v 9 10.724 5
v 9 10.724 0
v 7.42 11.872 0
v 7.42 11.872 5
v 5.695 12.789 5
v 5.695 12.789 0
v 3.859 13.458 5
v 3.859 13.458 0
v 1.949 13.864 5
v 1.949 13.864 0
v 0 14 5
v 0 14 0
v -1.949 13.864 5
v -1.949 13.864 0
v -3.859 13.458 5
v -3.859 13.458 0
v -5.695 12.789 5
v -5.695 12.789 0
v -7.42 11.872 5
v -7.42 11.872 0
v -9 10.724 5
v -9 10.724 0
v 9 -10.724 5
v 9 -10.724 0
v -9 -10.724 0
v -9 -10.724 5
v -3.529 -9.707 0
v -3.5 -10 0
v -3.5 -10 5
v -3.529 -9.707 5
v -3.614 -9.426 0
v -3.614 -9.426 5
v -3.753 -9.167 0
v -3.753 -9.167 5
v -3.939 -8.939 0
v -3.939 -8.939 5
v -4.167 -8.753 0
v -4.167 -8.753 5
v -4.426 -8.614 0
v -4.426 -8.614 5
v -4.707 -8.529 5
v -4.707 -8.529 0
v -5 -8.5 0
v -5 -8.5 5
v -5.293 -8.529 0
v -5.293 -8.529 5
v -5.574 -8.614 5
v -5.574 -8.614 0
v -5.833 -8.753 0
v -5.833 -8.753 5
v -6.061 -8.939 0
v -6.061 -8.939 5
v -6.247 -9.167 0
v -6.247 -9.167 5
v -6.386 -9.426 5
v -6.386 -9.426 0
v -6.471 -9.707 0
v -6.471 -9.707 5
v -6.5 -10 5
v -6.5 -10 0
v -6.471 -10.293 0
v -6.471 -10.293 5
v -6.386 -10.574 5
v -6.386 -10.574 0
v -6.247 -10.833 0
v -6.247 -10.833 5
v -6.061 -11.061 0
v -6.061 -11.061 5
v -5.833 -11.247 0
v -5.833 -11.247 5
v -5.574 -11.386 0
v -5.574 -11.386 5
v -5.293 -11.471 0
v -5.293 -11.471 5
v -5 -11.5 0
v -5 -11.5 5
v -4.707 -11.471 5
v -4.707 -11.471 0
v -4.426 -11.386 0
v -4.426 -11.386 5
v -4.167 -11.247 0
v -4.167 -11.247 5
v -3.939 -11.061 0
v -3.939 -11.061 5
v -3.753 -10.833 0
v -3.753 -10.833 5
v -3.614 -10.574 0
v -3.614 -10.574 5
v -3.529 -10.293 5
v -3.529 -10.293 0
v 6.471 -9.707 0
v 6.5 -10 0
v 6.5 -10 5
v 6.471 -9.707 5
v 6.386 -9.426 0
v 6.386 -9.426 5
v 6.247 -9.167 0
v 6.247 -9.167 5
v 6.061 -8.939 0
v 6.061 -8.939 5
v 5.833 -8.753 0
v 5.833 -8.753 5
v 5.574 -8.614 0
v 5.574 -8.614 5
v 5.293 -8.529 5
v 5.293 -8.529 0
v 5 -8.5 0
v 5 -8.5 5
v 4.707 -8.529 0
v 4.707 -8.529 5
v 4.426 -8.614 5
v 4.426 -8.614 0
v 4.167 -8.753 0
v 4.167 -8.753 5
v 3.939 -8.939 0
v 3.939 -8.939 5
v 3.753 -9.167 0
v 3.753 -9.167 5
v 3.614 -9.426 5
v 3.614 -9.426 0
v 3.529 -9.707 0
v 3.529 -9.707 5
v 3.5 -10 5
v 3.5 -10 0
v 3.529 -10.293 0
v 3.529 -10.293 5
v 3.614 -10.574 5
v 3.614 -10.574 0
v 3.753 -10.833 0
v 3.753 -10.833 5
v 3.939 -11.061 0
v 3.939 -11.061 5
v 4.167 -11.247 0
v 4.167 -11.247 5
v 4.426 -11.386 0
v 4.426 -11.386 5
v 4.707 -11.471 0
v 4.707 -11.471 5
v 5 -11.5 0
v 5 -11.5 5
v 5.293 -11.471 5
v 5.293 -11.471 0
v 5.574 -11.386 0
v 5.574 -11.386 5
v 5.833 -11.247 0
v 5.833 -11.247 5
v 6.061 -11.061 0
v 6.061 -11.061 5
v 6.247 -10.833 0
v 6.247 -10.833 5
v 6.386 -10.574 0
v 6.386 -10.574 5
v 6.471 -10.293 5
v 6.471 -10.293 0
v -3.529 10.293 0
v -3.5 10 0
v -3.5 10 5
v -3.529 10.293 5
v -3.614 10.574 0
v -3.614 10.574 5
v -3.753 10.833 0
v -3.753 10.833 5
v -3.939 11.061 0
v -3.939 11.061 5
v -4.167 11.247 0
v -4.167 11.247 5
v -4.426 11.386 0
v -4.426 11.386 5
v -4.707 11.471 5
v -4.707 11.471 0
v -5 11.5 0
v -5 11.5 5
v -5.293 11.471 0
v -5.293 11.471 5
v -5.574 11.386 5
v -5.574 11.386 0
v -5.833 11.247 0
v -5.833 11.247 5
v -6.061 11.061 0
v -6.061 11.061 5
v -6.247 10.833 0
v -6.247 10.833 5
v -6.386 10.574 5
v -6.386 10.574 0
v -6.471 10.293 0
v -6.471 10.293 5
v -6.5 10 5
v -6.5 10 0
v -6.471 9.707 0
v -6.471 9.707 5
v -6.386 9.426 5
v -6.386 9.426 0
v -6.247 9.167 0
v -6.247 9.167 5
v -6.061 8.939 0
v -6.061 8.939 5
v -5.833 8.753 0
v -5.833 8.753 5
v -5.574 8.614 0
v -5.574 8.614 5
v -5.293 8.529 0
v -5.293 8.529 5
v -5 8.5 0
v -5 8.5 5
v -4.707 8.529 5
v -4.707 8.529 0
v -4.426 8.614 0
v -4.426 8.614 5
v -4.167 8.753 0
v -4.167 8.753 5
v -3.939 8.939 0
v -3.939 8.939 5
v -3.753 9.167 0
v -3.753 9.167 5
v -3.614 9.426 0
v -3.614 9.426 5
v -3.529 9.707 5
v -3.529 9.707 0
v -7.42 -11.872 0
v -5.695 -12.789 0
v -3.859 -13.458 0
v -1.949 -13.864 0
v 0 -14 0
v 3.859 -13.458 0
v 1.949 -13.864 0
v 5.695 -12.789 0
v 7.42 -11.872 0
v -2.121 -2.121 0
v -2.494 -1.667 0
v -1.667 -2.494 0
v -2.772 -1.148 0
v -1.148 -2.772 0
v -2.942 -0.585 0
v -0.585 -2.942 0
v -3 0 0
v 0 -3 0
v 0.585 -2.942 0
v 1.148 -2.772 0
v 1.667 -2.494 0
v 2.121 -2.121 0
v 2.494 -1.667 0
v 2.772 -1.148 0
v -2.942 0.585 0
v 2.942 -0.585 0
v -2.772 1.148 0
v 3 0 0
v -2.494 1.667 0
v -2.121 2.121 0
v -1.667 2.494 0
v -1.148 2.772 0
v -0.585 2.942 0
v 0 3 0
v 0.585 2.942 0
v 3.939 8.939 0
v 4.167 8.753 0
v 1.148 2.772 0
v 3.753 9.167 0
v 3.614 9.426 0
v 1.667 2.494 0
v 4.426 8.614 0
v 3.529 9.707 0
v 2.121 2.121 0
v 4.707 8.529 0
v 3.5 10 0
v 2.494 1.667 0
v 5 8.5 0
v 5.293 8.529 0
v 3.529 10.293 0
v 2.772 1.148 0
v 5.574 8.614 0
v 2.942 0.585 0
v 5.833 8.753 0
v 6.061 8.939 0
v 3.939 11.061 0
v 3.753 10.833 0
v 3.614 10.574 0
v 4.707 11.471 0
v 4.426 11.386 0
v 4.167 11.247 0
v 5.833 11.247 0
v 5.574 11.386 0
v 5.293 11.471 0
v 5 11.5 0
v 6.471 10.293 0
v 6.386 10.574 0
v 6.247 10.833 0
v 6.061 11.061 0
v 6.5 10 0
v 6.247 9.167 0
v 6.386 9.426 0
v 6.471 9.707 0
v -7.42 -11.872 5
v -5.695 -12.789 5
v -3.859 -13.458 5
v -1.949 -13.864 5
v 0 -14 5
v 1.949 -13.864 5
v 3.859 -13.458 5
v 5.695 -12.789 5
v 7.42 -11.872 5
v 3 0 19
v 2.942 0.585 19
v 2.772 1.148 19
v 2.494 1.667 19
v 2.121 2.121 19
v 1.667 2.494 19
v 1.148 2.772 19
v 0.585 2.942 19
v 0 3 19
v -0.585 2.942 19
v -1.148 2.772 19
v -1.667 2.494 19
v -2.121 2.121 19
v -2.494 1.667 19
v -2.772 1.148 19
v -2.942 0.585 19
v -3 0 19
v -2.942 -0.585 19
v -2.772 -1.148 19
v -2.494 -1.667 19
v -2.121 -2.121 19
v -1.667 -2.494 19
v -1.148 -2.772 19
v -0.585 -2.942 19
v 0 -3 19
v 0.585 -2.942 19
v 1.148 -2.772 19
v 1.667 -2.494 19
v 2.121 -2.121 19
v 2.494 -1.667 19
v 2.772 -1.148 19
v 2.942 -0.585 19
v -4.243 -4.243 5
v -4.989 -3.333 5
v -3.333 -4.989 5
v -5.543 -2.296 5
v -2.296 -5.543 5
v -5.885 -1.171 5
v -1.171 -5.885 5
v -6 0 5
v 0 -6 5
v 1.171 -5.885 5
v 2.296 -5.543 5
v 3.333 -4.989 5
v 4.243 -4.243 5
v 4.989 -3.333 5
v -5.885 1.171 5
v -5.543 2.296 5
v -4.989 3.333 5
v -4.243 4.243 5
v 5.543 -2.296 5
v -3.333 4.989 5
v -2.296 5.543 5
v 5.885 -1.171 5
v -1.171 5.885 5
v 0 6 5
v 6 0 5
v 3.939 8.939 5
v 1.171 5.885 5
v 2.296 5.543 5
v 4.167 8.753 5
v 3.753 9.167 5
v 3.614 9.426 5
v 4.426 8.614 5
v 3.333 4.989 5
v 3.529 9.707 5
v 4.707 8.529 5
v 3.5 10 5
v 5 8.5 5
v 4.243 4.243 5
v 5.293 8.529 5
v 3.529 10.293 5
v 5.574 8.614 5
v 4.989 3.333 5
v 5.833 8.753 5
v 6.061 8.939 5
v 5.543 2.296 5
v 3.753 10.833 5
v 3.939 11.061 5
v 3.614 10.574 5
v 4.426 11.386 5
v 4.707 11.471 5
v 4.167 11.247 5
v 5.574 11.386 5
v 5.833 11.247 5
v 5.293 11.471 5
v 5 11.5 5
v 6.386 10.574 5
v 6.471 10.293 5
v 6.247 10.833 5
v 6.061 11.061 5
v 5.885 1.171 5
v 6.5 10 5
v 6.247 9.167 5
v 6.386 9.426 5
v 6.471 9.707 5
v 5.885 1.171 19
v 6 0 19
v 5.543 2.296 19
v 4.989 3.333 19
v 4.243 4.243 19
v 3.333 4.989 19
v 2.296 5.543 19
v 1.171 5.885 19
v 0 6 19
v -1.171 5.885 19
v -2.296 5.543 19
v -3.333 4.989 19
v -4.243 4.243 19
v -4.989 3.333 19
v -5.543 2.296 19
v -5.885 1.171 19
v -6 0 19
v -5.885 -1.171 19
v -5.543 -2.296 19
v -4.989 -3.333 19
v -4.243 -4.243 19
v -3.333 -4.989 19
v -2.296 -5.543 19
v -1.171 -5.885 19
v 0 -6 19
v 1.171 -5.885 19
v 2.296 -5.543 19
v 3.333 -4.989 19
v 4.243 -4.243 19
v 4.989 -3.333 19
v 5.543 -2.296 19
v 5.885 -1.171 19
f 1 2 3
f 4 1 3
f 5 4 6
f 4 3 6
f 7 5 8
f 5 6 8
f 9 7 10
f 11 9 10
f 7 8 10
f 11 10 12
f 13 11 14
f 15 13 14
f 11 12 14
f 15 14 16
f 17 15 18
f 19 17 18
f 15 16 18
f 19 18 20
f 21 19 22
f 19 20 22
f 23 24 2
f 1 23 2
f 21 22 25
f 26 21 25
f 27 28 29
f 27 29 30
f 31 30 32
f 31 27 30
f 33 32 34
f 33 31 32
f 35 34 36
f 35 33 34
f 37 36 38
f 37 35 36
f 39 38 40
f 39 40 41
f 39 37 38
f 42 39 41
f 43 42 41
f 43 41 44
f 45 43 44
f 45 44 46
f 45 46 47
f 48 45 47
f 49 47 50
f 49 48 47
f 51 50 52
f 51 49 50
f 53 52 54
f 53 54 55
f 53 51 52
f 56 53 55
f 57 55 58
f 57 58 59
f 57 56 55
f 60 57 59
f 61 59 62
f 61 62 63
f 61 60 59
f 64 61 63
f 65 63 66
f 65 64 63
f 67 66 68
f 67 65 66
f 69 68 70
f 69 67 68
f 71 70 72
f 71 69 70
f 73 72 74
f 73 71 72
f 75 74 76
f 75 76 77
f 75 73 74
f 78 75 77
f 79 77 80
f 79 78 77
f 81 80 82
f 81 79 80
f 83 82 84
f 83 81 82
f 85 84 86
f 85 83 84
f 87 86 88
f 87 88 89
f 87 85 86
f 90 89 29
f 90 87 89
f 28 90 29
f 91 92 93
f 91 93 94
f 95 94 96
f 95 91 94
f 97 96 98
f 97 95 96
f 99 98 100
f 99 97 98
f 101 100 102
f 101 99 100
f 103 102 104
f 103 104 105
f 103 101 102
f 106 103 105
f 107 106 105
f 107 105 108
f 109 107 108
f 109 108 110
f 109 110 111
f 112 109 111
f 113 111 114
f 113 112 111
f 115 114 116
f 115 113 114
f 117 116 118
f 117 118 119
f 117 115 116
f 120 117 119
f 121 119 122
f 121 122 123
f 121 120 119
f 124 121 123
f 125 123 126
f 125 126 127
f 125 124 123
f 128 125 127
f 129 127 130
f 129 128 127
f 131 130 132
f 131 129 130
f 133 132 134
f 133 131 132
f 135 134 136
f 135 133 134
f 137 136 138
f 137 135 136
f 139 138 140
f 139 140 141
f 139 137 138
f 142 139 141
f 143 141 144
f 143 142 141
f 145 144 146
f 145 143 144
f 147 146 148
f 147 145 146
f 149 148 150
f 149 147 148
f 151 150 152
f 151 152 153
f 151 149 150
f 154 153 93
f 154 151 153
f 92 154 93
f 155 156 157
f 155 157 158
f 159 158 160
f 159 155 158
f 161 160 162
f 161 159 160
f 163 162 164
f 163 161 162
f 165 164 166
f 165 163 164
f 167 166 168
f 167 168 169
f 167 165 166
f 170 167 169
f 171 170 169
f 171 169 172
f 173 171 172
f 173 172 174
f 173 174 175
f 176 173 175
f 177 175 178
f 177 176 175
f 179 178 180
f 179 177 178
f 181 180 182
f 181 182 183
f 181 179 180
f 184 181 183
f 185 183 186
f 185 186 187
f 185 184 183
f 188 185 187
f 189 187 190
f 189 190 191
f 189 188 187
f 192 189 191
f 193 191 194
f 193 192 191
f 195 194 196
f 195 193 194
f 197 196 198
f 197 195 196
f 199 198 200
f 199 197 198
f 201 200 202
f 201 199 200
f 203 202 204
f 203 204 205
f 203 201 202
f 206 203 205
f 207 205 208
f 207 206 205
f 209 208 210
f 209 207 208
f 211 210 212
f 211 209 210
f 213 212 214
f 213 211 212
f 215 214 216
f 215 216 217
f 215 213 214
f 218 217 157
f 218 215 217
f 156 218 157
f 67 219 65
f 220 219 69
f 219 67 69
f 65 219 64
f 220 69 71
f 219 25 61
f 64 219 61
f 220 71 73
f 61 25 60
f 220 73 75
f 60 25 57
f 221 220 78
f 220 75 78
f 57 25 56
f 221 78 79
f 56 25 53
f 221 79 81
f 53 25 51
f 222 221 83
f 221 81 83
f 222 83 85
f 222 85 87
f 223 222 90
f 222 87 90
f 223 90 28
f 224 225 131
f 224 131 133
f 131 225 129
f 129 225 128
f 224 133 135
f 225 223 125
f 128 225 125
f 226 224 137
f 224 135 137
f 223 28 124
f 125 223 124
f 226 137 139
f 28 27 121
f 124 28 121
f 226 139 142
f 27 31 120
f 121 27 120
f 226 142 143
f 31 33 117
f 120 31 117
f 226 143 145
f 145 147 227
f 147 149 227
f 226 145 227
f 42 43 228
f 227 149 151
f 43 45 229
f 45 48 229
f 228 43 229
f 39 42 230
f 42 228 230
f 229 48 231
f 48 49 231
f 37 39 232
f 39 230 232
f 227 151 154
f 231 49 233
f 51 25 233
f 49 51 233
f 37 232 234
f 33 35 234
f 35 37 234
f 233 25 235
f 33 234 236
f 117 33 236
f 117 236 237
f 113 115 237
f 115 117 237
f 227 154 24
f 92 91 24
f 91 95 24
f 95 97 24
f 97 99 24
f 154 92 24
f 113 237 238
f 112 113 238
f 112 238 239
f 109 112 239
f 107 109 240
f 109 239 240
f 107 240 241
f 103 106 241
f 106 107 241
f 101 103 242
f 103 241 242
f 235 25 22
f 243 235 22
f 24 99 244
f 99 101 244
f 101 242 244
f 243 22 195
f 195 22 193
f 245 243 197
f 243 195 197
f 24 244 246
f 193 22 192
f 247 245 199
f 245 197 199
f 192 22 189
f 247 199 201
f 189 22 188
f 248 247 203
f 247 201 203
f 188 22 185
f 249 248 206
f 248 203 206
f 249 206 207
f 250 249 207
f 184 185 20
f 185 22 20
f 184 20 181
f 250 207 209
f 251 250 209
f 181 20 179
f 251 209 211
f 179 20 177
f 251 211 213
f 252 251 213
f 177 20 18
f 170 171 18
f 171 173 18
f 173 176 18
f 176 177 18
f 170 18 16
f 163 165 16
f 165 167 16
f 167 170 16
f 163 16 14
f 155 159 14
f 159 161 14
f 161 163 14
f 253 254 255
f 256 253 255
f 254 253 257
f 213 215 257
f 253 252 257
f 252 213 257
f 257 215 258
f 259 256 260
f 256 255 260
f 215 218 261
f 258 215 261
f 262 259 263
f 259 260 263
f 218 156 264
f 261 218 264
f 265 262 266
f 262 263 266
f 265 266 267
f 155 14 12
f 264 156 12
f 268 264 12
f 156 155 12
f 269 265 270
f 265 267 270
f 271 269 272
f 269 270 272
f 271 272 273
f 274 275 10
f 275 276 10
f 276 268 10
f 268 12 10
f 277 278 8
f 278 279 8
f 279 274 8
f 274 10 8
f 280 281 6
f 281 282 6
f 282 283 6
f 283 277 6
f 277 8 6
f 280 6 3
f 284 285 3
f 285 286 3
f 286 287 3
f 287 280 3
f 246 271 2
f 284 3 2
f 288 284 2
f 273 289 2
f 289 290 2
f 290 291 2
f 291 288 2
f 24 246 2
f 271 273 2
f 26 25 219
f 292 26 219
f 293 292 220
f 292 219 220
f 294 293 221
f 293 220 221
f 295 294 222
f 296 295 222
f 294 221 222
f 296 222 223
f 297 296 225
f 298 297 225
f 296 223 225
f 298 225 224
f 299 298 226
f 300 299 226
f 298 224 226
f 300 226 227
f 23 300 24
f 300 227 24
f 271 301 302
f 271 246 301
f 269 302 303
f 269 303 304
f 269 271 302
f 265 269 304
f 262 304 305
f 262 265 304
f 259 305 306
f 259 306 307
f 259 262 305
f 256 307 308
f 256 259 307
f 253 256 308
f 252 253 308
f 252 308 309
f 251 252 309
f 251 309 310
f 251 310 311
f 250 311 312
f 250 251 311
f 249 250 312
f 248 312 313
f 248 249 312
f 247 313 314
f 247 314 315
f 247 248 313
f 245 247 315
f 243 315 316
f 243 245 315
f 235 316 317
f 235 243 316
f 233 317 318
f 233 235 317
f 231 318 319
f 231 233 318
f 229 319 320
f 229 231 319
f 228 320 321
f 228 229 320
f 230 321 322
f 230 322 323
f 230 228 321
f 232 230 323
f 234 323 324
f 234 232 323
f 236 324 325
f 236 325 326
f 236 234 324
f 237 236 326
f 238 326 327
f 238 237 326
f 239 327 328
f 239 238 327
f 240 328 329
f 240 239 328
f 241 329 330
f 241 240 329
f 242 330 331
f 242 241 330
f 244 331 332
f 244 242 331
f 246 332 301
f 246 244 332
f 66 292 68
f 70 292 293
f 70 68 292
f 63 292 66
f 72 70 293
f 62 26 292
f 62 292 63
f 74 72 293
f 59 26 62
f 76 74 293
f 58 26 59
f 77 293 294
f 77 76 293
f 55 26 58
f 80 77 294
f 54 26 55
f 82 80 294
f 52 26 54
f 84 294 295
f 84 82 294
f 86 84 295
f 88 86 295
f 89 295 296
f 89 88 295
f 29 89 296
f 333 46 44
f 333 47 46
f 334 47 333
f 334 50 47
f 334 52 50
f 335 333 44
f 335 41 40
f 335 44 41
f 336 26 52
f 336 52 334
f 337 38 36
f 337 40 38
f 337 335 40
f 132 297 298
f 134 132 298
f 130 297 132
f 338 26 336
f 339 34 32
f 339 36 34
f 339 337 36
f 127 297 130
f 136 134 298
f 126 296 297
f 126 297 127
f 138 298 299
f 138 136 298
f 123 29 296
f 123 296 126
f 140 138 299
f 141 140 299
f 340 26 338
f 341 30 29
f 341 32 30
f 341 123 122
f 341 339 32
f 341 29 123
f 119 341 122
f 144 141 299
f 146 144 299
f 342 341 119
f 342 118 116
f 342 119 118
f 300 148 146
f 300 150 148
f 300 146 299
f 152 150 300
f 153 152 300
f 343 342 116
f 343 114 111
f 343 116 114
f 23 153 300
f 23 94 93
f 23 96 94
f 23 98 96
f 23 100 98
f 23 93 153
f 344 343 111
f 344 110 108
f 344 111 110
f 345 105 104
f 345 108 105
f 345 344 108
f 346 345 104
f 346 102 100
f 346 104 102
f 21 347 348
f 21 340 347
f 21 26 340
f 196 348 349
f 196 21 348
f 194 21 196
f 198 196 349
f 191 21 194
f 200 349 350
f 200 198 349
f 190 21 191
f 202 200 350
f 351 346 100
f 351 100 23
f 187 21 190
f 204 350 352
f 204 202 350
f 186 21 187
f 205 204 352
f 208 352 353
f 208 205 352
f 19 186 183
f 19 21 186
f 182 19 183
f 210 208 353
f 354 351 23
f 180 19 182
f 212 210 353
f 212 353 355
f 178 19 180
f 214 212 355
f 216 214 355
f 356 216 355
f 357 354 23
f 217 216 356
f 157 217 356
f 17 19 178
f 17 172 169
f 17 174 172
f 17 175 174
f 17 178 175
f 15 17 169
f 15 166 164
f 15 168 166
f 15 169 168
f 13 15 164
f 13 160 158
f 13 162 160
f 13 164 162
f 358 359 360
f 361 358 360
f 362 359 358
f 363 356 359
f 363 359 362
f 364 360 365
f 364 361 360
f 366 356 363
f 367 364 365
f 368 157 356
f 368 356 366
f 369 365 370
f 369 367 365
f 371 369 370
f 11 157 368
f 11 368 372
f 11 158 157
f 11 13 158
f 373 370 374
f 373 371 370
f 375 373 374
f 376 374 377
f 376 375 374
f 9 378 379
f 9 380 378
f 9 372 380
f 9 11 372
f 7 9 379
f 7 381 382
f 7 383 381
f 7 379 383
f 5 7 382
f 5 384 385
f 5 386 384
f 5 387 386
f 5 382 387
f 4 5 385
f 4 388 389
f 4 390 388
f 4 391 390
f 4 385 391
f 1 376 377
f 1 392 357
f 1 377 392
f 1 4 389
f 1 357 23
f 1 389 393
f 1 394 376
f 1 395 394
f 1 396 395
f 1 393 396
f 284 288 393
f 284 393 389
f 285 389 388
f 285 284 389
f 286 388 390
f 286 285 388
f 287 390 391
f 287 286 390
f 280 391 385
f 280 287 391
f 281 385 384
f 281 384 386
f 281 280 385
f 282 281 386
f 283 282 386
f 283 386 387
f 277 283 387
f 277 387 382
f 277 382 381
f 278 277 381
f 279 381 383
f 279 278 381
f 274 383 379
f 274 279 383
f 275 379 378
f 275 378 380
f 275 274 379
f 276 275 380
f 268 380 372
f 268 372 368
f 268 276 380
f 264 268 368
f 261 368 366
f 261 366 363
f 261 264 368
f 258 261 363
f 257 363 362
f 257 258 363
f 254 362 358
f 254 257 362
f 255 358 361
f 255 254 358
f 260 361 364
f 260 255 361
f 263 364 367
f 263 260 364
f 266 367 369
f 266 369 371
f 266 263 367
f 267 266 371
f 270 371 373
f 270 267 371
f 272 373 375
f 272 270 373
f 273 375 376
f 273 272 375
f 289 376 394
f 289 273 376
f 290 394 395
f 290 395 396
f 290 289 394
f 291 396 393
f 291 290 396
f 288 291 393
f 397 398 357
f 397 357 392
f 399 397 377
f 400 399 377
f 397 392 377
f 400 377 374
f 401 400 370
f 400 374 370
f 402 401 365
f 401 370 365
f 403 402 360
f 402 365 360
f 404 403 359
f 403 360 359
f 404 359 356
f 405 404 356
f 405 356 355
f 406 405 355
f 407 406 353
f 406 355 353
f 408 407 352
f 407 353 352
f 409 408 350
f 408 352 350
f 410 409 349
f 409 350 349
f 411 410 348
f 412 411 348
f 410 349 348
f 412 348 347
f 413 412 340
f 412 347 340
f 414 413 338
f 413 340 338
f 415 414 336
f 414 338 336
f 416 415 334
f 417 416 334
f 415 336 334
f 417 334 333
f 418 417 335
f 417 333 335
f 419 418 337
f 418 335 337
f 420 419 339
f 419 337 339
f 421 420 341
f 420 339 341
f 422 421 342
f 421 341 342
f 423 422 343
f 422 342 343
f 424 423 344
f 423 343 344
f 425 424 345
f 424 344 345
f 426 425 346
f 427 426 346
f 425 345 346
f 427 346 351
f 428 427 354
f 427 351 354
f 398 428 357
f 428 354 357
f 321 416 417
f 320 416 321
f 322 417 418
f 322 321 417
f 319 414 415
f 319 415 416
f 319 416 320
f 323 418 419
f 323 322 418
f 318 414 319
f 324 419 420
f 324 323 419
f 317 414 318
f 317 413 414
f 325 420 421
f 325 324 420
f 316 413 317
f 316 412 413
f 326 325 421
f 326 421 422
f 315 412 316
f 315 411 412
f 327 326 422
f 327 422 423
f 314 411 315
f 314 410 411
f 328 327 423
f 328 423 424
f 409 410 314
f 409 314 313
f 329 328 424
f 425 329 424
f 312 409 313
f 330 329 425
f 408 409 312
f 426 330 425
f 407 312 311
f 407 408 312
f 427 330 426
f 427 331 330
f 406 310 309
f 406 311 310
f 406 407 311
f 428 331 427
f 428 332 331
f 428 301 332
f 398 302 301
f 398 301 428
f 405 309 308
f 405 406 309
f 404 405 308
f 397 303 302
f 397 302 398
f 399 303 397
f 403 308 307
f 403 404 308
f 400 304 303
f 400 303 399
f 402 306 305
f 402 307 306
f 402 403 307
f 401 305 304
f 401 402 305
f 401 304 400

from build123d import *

# Parameters (mm, degrees)
SKETCH1_R           = 3
SKETCH1_R_2         = 1.5
BOSS_EXTRUDE1_DEPTH = 5
SKETCH2_R           = 6
SKETCH2_R_2         = 3
BOSS_EXTRUDE2_DEPTH = 14


with BuildPart() as part:
    # Sketch1 → Boss-Extrude1 (new body)
    with BuildSketch(Plane.XY):
        with BuildLine():
            Line((-9, 10.723805295), (-9, -10.723805295))
            ThreePointArc((-9, -10.723805295), (0, -14), (9, -10.723805295))
            Line((9, -10.723805295), (9, 10.723805295))
            ThreePointArc((9, 10.723805295), (0, 14), (-9, 10.723805295))
        make_face()
        Circle(SKETCH1_R, mode=Mode.SUBTRACT)
        with Locations((-5, 10)):
            Circle(SKETCH1_R_2, mode=Mode.SUBTRACT)
        with Locations((5, 10)):
            Circle(SKETCH1_R_2, mode=Mode.SUBTRACT)
        with Locations((-5, -10)):
            Circle(SKETCH1_R_2, mode=Mode.SUBTRACT)
        with Locations((5, -10)):
            Circle(SKETCH1_R_2, mode=Mode.SUBTRACT)
    extrude(amount=BOSS_EXTRUDE1_DEPTH)

    # Sketch2 → Boss-Extrude2 (add)
    with BuildSketch(Plane.XY.offset(5)):
        Circle(SKETCH2_R)
        Circle(SKETCH2_R_2, mode=Mode.SUBTRACT)
    extrude(amount=BOSS_EXTRUDE2_DEPTH)


solid = part.part
